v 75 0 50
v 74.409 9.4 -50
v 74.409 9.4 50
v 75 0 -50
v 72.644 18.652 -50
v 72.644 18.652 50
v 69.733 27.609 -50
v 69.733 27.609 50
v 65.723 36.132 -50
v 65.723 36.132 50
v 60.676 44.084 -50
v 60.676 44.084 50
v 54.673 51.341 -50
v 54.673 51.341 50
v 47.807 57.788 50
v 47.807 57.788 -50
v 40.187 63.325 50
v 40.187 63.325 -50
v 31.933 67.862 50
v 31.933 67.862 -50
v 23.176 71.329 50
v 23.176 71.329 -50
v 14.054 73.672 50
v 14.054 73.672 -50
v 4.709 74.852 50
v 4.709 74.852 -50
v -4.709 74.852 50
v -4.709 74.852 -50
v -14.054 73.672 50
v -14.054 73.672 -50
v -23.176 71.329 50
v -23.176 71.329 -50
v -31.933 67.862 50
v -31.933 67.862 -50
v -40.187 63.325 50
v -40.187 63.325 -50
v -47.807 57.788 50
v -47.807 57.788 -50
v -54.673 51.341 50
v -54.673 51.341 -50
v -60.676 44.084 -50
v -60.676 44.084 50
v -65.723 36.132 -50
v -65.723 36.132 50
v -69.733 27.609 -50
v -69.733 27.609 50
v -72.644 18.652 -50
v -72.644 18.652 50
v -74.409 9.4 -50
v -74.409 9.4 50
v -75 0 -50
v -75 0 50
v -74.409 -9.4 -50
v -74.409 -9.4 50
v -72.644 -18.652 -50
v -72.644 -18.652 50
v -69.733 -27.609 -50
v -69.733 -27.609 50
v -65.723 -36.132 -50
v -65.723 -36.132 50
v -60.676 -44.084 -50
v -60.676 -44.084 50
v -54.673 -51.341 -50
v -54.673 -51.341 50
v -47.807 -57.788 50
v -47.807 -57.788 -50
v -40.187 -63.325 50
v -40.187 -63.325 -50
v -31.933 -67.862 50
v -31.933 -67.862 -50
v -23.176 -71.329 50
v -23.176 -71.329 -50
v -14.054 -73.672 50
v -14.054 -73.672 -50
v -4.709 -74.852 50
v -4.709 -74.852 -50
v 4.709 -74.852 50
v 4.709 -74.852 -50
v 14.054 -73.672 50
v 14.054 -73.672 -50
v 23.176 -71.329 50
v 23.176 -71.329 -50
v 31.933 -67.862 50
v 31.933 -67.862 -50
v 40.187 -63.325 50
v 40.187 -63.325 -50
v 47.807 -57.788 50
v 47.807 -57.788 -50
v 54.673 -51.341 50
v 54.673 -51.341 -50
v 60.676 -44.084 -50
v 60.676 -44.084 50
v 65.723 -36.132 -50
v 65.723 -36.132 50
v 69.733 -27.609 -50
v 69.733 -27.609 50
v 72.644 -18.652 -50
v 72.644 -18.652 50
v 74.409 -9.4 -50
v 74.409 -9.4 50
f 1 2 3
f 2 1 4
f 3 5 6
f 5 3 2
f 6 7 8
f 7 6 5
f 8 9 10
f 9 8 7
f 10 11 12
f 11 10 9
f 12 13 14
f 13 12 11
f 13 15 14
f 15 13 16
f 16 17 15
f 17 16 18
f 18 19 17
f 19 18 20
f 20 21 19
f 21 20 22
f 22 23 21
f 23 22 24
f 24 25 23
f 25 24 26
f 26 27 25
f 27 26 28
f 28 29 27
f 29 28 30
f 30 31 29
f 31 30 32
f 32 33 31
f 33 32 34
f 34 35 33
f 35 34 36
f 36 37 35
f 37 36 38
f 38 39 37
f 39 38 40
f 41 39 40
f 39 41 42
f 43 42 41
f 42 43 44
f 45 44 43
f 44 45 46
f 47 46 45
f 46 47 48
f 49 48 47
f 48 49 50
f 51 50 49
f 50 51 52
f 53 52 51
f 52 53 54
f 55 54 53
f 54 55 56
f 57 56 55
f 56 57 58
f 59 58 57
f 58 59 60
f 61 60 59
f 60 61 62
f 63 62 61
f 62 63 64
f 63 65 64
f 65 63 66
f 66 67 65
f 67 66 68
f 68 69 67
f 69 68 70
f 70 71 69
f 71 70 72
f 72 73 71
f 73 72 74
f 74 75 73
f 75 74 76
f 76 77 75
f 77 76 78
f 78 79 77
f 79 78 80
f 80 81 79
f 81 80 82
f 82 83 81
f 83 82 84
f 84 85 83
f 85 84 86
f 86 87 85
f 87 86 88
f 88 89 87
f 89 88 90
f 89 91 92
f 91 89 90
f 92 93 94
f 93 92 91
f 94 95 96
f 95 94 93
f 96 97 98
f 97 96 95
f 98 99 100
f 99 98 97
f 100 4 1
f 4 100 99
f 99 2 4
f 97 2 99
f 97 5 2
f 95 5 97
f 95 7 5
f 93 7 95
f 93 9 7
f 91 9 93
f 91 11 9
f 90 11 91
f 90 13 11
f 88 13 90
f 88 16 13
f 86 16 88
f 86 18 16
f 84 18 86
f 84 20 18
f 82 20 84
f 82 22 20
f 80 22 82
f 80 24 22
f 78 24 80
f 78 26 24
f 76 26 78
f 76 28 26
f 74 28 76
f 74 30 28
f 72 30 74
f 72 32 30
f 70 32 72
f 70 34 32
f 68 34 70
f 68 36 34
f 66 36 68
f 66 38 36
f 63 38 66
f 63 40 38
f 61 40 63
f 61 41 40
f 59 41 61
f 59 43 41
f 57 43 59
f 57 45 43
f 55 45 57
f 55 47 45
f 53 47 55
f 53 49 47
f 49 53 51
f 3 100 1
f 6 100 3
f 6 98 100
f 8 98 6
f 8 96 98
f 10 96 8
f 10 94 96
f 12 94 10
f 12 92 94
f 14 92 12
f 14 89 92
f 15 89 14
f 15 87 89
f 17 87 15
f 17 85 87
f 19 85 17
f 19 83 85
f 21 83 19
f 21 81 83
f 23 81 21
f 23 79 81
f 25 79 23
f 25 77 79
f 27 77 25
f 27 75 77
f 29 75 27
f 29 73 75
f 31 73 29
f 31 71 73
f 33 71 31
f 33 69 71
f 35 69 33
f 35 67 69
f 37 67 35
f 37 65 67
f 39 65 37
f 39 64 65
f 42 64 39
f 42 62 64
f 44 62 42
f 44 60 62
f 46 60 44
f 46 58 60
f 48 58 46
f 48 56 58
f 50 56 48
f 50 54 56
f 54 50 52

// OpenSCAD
// Cylinder 10cm tall, 150cm diameter
// All dimensions in millimeters

// Parameters
height = 100;    // 10 cm in mm
radius = 75;    // 150 cm diameter = 1500mm diameter = 750mm radius
faces = 50;
// Create cylinder
cylinder(h = height, r = radius, center = true, $fn = faces);

// Note: center=true places the cylinder centered on the z-axis
// This makes it easier to work with in most cases 
